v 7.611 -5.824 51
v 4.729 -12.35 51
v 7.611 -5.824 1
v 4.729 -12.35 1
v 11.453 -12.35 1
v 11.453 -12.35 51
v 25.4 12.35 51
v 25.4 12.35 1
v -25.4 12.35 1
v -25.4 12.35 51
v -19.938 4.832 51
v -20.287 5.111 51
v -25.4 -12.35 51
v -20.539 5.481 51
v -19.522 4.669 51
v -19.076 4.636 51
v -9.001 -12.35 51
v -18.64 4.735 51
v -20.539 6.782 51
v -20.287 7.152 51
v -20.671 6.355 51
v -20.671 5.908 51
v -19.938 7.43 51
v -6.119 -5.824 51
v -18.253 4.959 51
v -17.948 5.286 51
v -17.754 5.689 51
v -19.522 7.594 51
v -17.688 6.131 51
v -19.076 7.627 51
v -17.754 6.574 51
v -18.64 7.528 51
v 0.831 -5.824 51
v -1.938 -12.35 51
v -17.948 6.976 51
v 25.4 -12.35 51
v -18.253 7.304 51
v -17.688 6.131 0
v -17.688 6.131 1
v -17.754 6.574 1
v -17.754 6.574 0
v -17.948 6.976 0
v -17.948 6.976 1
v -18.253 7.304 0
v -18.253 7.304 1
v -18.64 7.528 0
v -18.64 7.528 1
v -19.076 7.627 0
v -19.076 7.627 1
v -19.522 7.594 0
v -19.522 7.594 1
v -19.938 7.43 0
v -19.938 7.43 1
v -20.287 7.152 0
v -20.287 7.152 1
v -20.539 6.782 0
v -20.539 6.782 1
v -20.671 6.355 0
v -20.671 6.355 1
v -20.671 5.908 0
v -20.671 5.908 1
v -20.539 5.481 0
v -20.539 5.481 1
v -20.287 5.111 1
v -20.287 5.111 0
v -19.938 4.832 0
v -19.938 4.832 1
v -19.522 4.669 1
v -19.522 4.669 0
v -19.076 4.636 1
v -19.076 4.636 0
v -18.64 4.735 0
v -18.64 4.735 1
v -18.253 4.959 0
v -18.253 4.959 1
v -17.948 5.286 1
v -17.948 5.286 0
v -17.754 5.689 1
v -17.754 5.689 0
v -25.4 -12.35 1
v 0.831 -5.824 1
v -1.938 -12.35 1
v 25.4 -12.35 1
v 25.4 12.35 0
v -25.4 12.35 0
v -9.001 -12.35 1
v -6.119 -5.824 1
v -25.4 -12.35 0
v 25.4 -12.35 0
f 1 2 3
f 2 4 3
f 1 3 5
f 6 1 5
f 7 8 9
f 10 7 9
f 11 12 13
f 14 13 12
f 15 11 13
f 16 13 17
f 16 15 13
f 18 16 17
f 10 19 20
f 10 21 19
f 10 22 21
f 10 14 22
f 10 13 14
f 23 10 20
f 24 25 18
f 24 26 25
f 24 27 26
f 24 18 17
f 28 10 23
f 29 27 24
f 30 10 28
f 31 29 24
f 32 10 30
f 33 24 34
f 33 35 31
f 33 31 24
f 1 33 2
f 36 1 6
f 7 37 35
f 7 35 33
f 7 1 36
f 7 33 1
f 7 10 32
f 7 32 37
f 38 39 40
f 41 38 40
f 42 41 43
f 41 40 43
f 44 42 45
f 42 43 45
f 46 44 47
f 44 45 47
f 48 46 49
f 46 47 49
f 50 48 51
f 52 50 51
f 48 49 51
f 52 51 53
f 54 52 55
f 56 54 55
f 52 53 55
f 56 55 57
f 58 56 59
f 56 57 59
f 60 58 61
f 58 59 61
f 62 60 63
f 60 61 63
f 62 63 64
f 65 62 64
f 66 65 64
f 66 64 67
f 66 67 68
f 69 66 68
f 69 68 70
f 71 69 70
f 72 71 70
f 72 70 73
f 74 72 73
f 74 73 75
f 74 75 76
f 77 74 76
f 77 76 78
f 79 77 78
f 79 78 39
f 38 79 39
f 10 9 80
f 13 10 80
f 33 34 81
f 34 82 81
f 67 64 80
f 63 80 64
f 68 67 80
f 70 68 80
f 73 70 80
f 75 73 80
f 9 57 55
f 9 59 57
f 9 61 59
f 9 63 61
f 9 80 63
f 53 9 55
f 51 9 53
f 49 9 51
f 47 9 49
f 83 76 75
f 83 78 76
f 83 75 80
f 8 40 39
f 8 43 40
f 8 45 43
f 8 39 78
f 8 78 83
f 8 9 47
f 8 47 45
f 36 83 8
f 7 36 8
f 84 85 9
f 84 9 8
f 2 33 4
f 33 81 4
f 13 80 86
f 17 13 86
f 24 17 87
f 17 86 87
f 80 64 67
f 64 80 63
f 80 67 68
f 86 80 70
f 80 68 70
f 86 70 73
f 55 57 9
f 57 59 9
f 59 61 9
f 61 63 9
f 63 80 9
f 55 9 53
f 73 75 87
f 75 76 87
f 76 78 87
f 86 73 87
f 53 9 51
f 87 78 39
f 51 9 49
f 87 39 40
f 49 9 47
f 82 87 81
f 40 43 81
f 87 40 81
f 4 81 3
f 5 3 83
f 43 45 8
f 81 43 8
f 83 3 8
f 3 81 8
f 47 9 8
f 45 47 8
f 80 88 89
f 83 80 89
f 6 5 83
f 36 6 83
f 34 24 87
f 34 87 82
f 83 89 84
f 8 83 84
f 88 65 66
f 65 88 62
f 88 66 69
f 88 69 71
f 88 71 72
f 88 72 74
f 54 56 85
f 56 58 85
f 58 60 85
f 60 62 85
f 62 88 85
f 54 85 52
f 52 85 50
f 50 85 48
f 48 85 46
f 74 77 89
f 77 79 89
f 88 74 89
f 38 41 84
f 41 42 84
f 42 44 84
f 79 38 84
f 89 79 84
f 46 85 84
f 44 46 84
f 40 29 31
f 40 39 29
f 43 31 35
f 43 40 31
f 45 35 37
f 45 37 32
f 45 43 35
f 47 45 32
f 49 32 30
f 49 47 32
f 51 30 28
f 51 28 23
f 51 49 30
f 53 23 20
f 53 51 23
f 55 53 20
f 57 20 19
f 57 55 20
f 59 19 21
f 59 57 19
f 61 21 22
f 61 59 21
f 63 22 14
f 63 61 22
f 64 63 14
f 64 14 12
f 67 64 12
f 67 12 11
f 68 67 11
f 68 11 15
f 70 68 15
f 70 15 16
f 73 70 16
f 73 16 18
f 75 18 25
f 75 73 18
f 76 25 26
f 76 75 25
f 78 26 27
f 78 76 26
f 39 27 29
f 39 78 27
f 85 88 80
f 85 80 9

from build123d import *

# Parameters (mm, degrees)
F0_W     = 50.8
F0_H     = 24.7
F1_DEPTH = 1
F2_R     = 1.5
F3_DEPTH = 25
F4_R     = 1.5
F5_DEPTH = 25
F6_DEPTH = 25


# Not quite as in the source:
# - a feature of the source that left no trace in its solid (it failed there, or was rolled back) is left out


with BuildPart() as f1:
    # F0 (on Top) → F1 (new body)
    with BuildSketch(Plane.XY):
        Rectangle(F0_W, F0_H)
    extrude(amount=F1_DEPTH)

    # F2 (on face) → F3 (cut)
    with BuildSketch(Plane.XY.offset(1)):
        with Locations((-19.1877838224, 6.1313840561)):
            Circle(F2_R)
    extrude(amount=-F3_DEPTH, mode=Mode.SUBTRACT)


with BuildPart() as f5:
    # F4 (on face) → F5 (new body)
    with BuildSketch(Plane.XY.offset(1)):
        Polygon((-25.4, -12.35), (-9.0006701648, -12.35), (-6.1190491542, -5.8241537772), (-1.9378731959, -12.35), (0.8307432872, -5.8241537772), (4.7294073738, -12.35), (7.6110288501, -5.8241537772), (11.4531898871, -12.35), (25.4, -12.35), (25.4, 12.35), (-25.4, 12.35), align=None)
        with Locations((-19.1877838224, 6.1313840561)):
            Circle(F4_R, mode=Mode.SUBTRACT)
    extrude(amount=F5_DEPTH)

    # F6 (add): a face of the model
    f6_faces = [f5.faces().sort_by_distance(p)[0] for p in [
        (0.0562187638, 0.5383064409, 26),
    ]]
    extrude(f6_faces, amount=F6_DEPTH)


solid = Compound([f1.part, f5.part])
